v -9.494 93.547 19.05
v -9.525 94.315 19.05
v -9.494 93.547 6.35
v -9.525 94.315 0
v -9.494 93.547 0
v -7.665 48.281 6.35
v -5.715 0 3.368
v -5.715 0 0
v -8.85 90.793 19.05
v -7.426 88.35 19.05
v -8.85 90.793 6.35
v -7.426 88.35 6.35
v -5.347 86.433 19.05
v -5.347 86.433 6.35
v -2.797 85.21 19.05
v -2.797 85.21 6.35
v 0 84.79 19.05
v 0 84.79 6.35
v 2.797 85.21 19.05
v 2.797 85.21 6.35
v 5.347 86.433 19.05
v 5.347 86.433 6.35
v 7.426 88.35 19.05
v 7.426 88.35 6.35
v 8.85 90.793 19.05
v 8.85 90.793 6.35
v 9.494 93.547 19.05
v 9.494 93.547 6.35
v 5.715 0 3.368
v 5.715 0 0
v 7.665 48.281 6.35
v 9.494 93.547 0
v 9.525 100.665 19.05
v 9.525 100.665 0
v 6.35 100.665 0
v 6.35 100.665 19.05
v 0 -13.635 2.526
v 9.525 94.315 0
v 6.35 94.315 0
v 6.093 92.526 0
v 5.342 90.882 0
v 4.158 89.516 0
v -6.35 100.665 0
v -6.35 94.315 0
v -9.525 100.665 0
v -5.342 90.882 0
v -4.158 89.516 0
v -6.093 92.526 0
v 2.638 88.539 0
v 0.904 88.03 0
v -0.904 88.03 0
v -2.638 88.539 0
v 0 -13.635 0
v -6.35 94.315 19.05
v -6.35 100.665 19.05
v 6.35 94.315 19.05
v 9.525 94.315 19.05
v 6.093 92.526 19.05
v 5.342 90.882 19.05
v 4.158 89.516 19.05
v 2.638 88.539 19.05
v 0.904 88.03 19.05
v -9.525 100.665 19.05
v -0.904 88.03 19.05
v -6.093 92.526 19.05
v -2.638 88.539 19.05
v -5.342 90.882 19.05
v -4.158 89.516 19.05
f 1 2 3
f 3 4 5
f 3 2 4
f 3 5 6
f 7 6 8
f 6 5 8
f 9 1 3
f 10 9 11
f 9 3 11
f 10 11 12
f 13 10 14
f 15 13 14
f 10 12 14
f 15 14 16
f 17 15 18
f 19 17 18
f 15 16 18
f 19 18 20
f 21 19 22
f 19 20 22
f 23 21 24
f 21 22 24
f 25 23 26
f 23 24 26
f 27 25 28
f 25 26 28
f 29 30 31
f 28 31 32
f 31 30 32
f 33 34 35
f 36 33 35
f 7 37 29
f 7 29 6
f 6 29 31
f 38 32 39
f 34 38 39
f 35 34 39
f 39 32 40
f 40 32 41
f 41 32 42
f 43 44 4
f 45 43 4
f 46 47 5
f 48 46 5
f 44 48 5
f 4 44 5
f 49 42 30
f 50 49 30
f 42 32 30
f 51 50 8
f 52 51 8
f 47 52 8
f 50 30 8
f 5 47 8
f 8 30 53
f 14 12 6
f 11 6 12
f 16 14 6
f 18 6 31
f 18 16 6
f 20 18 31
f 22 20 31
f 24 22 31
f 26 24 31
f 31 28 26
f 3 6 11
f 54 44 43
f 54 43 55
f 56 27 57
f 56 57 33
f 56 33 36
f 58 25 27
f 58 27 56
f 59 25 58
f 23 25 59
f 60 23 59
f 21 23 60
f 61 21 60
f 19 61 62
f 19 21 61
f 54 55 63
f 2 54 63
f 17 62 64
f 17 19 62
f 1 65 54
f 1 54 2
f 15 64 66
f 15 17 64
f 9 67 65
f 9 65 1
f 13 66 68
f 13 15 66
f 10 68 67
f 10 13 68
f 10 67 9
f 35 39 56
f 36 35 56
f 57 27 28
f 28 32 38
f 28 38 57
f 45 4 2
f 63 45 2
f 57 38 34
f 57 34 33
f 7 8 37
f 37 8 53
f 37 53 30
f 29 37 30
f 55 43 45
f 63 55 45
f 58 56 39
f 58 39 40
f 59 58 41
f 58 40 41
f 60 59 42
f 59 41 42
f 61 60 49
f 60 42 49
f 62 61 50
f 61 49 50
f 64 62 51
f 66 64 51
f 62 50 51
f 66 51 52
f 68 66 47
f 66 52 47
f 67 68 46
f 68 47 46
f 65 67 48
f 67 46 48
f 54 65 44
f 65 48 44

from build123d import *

# Parameters (mm, degrees)
F1_DEPTH      = 6.35
F2_DEPTH      = 19.05
F3_DEPTH      = 6.35
F5_DEPTH      = 25.4
F5_DEPTH_BACK = 25.4


with BuildPart() as f1:
    # F0 (on Top) → F1 (new body)
    with BuildSketch(Plane.XY):
        with BuildLine():
            Line((-9.4939634524, 93.546902302), (-5.715, 0))
            Line((-5.715, 0), (0, -13.6347989514))
            Line((0, -13.6347989514), (5.715, 0))
            Line((5.715, 0), (9.4939634524, 93.546902302))
            ThreePointArc((9.4939634524, 93.546902302), (0, 84.7902010486), (-9.4939634524, 93.546902302))
        make_face()
    extrude(amount=F1_DEPTH)

    # F0 (on Top) → F2 (join)
    with BuildSketch(Plane.XY):
        with BuildLine():
            Line((-9.525, 94.3152010486), (-9.4939634524, 93.546902302))
            ThreePointArc((-9.4939634524, 93.546902302), (0, 84.7902010486), (9.4939634524, 93.546902302))
            Line((9.4939634524, 93.546902302), (9.525, 94.3152010486))
            Line((9.525, 94.3152010486), (6.35, 94.3152010486))
            ThreePointArc((6.35, 94.3152010486), (0, 87.9652010486), (-6.35, 94.3152010486))
            Line((-6.35, 94.3152010486), (-9.525, 94.3152010486))
        make_face()
    extrude(amount=F2_DEPTH)

    # F3 (add): faces of the model
    f3_faces = [f1.faces().sort_by_distance(p)[0] for p in [
        (-7.9375, 94.3152010486, 9.525),
        (7.9375, 94.3152010486, 9.525),
    ]]
    extrude(f3_faces, amount=F3_DEPTH)

    # F4 (on Right) → F5 (cut, two sides)
    with BuildSketch(Plane.YZ) as f5_sk:
        Polygon((-30.6564283764, 9.0817261184), (-14.1004319647, 2.4969553254), (49.8651257087, 6.4478169652), (49.8651257087, 26.7665392731), align=None)
    extrude(amount=-F5_DEPTH, mode=Mode.SUBTRACT)
    extrude(f5_sk.sketch, amount=F5_DEPTH_BACK, mode=Mode.SUBTRACT)


solid = f1.part
